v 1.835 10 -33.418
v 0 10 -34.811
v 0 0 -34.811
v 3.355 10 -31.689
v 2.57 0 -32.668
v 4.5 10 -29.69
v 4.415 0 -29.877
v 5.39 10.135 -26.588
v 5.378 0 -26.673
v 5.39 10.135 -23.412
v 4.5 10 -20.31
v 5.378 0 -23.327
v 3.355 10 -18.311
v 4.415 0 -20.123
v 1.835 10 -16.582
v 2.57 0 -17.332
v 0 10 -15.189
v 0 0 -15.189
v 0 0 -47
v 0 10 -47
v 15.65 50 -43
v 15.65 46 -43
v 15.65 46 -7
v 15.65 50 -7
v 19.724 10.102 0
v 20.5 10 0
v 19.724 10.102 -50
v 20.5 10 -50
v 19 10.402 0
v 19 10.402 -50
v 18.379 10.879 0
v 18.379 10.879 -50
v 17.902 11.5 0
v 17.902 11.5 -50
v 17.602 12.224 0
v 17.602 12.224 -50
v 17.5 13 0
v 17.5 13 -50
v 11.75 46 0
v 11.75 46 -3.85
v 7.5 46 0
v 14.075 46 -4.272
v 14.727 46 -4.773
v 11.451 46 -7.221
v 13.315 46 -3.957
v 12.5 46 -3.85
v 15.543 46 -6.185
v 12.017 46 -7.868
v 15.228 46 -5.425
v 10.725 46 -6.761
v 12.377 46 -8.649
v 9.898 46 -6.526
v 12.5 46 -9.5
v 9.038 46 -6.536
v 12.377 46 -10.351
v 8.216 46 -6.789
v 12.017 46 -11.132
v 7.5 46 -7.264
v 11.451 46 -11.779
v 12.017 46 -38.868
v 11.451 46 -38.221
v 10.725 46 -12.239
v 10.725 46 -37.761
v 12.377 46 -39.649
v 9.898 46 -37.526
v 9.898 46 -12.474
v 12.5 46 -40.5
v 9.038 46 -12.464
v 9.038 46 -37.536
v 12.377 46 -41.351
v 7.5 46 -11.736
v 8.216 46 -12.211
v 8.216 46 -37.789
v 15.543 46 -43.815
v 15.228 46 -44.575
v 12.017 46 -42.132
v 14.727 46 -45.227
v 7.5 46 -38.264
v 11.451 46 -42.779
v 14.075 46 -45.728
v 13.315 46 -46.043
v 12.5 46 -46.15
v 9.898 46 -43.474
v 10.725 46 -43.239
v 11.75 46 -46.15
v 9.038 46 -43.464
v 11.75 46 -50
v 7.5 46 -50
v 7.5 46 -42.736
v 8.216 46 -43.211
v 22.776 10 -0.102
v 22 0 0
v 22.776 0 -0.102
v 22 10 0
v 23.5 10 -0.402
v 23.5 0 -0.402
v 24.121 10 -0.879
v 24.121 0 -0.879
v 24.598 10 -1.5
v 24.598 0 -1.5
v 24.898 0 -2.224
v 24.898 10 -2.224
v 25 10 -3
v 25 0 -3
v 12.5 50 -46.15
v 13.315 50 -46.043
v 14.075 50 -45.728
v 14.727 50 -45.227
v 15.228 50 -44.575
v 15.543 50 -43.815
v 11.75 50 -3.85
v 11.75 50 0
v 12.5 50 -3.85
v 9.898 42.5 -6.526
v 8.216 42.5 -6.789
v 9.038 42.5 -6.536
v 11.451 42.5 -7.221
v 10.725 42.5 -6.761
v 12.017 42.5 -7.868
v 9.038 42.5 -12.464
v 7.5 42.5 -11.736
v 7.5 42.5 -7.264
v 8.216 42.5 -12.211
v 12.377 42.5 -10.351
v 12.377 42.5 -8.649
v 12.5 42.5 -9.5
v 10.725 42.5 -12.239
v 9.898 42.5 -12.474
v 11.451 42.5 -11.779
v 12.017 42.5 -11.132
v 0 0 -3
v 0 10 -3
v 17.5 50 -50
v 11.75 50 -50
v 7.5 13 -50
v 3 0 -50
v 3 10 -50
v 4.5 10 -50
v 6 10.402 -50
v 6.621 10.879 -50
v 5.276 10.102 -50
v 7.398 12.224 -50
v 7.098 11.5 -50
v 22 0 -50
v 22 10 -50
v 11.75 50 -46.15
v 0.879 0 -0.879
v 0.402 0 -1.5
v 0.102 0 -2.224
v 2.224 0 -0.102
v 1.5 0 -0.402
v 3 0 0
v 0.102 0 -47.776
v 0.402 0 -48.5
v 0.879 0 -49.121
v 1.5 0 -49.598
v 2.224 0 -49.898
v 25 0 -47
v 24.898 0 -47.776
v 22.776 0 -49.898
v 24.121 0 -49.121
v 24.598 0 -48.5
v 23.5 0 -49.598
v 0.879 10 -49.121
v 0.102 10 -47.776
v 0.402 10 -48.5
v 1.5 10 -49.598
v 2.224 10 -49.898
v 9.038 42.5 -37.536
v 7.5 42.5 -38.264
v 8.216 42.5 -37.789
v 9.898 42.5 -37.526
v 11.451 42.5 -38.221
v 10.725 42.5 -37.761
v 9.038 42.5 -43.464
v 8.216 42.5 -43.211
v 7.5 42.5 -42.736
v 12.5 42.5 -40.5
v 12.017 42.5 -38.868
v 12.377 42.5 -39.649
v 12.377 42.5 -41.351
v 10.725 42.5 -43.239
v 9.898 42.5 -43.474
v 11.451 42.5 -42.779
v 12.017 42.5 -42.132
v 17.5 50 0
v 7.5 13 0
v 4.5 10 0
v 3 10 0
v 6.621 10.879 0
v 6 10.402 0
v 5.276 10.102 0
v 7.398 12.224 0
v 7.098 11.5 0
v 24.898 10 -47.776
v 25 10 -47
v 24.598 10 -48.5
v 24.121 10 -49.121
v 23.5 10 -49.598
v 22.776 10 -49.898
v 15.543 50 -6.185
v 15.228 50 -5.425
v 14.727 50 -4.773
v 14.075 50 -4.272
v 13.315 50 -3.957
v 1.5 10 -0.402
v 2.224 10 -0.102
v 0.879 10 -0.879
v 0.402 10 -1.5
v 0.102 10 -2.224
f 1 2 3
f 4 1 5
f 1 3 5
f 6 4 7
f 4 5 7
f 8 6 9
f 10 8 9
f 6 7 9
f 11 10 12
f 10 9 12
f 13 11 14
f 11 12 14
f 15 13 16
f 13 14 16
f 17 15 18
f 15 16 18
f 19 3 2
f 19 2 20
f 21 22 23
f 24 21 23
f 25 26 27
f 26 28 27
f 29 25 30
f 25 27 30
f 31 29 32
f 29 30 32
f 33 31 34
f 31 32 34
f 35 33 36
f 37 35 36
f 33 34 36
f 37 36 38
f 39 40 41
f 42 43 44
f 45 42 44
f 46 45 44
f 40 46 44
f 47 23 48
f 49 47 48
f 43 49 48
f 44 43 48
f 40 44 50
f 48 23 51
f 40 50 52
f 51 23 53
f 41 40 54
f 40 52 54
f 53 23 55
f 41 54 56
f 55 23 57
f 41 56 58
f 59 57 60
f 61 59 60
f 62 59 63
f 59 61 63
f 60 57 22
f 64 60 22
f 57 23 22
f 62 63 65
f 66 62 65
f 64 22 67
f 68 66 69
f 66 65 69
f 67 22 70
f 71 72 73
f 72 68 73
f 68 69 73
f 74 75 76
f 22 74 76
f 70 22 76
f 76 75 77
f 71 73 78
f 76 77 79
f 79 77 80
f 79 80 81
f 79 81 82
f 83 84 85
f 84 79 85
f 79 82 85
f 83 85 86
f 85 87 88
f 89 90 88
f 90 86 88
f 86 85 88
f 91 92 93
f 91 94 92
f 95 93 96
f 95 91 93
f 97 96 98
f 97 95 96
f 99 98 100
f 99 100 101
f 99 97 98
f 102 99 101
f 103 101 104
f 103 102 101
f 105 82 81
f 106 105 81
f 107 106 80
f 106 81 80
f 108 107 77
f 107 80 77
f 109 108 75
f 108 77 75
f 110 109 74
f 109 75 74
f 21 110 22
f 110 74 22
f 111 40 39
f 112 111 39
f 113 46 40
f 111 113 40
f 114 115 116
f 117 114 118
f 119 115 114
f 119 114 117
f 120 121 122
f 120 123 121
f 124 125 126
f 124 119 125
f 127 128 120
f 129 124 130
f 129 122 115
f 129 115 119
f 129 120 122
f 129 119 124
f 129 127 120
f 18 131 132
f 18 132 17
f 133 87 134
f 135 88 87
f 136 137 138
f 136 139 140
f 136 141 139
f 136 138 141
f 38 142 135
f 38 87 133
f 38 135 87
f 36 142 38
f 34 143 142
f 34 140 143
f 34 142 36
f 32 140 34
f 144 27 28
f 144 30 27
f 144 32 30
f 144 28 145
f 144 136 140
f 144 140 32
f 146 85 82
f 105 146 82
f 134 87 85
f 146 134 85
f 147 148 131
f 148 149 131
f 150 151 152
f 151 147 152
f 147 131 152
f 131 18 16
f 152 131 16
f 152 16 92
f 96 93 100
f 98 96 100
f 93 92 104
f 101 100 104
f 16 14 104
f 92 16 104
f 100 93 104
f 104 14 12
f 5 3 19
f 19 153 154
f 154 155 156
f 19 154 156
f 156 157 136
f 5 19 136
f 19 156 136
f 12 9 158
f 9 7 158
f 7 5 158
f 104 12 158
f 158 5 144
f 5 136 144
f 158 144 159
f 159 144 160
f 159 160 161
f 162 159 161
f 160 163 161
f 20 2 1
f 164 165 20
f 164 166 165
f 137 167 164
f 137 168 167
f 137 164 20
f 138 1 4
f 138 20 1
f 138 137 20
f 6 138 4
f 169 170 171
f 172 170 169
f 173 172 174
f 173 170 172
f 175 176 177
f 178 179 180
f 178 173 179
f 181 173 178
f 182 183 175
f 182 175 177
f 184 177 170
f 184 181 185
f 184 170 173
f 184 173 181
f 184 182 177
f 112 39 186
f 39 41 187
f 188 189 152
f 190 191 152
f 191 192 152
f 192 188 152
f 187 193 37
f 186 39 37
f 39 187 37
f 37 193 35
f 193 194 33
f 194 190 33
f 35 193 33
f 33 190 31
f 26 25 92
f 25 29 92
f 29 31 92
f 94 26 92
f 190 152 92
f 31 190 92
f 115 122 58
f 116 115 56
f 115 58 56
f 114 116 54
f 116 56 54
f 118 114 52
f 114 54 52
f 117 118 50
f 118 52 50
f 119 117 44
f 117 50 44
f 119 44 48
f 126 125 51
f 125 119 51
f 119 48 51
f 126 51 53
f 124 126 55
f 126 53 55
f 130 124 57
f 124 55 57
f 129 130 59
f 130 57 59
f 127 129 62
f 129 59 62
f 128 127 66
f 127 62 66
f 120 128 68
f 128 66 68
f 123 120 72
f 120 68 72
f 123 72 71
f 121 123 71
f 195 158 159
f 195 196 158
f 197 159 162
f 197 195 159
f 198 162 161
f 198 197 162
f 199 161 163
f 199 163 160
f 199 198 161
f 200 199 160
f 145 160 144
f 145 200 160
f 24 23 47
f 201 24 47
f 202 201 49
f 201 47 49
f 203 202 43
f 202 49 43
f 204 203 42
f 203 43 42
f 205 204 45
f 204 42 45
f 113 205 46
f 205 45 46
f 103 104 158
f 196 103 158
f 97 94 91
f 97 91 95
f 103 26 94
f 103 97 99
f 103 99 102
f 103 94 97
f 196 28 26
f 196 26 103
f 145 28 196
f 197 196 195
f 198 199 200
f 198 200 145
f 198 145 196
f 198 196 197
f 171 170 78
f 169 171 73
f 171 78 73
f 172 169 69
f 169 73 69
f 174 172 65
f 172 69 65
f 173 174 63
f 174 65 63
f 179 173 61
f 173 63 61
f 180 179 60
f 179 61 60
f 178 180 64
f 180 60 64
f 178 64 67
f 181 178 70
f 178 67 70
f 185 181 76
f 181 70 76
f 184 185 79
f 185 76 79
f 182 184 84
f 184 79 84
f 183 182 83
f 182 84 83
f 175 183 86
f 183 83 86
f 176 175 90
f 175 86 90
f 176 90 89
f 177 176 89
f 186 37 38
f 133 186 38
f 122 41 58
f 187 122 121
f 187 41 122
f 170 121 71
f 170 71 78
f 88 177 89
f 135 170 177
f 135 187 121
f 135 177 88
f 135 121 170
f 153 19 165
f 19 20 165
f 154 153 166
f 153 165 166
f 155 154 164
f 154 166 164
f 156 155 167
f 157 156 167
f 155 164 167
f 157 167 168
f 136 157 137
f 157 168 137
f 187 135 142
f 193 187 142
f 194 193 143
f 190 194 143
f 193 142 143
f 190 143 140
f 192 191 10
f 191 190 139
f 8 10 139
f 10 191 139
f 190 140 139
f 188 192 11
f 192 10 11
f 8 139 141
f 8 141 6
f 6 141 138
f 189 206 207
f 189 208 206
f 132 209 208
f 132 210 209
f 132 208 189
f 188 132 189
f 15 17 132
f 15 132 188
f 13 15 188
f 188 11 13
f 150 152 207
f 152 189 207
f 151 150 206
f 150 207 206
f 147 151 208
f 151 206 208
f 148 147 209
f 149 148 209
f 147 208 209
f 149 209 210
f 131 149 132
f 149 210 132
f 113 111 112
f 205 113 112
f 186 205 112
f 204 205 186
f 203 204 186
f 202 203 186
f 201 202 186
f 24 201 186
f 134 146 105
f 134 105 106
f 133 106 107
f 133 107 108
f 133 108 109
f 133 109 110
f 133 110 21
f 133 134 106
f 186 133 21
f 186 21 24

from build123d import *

# Parameters (mm, degrees)
CROQUIS1_W              = 25
CROQUIS1_H              = 50
SALIENTE_EXTRUIR1_DEPTH = 10
CROQUIS2_W              = 10
CROQUIS2_H              = 50
SALIENTE_EXTRUIR2_DEPTH = 40
CROQUIS3_W              = 8
CROQUIS3_H              = 42
CORTAR_EXTRUIR1_DEPTH   = 4
REDONDEO1_R             = 3
CROQUIS4_W              = 4.1
CROQUIS4_H              = 50
CORTAR_EXTRUIR2_DEPTH   = 4
CROQUIS5_R              = 3
CORTAR_EXTRUIR3_DEPTH   = 3.5
CORTAR_EXTRUIR4_START   = -4
CORTAR_EXTRUIR4_DEPTH   = 4
REDONDEO2_R             = 3
CROQUIS7_R              = 11.5
CORTAR_EXTRUIR5_DEPTH   = 15


with BuildPart() as part:
    # Croquis1 → Saliente-Extruir1 (new body)
    with BuildSketch(Plane(origin=(0, 0, 0), x_dir=(1, 0, 0), z_dir=(0, 1, 0))):
        with Locations((12.5, 25)):
            Rectangle(CROQUIS1_W, CROQUIS1_H)
    extrude(amount=SALIENTE_EXTRUIR1_DEPTH)

    # Croquis2 → Saliente-Extruir2 (add)
    with BuildSketch(Plane(origin=(0, 10, 0), x_dir=(1, 0, 0), z_dir=(0, 1, 0))):
        with Locations((12.5, 25)):
            Rectangle(CROQUIS2_W, CROQUIS2_H)
    extrude(amount=SALIENTE_EXTRUIR2_DEPTH)

    # Croquis3 → Cortar-Extruir1 (cut)
    with BuildSketch(Plane(origin=(0, 50, 0), x_dir=(1, 0, 0), z_dir=(0, 1, 0))):
        with Locations((11.5, 25)):
            Rectangle(CROQUIS3_W, CROQUIS3_H)
    extrude(amount=-CORTAR_EXTRUIR1_DEPTH, mode=Mode.SUBTRACT)

    # Redondeo1
    redondeo1_edges = [part.edges().sort_by_distance(p)[0] for p in [
        (15.5, 48, -46),
        (15.5, 48, -4),
    ]]
    fillet(redondeo1_edges, radius=REDONDEO1_R)

    # Croquis4 → Cortar-Extruir2 (cut)
    with BuildSketch(Plane(origin=(0, 50, 0), x_dir=(1, 0, 0), z_dir=(0, 1, 0))):
        with Locations((9.55, 25)):
            Rectangle(CROQUIS4_W, CROQUIS4_H)
    extrude(amount=-CORTAR_EXTRUIR2_DEPTH, mode=Mode.SUBTRACT)

    # Croquis5 → Cortar-Extruir3 (cut)
    with BuildSketch(Plane(origin=(0, 46, 0), x_dir=(1, 0, 0), z_dir=(0, 1, 0))):
        with Locations((9.5, 9.5)):
            Circle(CROQUIS5_R)
        with Locations((9.5, 40.5)):
            Circle(CROQUIS5_R)
    extrude(amount=-CORTAR_EXTRUIR3_DEPTH, mode=Mode.SUBTRACT)

    # Croquis6 → Cortar-Extruir4 (cut)
    with BuildSketch(Plane(origin=(0, 50, 0), x_dir=(1, 0, 0), z_dir=(0, 1, 0)).offset(CORTAR_EXTRUIR4_START)):
        with BuildLine():
            Line((11.6, 4), (12.5, 4))
            ThreePointArc((12.5, 4), (14.621320344, 4.878679656), (15.5, 7))
            Line((15.5, 7), (15.5, 43))
            ThreePointArc((15.5, 43), (14.621320344, 45.121320344), (12.5, 46))
            Line((12.5, 46), (11.6, 46))
            Line((11.6, 46), (11.6, 50))
            Line((11.6, 50), (11.75, 50))
            Line((11.75, 50), (11.75, 46.15))
            Line((11.75, 46.15), (12.5, 46.15))
            ThreePointArc((12.5, 46.15), (14.727386361, 45.227386361), (15.65, 43))
            Line((15.65, 43), (15.65, 7))
            ThreePointArc((15.65, 7), (14.727386361, 4.772613639), (12.5, 3.85))
            Line((12.5, 3.85), (11.75, 3.85))
            Line((11.75, 3.85), (11.75, 0))
            Line((11.75, 0), (11.6, 0))
            Line((11.6, 0), (11.6, 4))
        make_face()
    extrude(amount=CORTAR_EXTRUIR4_DEPTH, mode=Mode.SUBTRACT)

    # Redondeo2
    redondeo2_edges = [part.edges().sort_by_distance(p)[0] for p in [
        (7.5, 10, -25),
        (17.5, 10, -25),
        (0, 5, -50),
        (25, 5, -50),
        (25, 5, 0),
        (0, 5, 0),
    ]]
    fillet(redondeo2_edges, radius=REDONDEO2_R)

    # Croquis7 → Cortar-Extruir5 (cut)
    with BuildSketch(Plane.XZ):
        with Locations((-6, -25)):
            Circle(CROQUIS7_R)
    extrude(amount=-CORTAR_EXTRUIR5_DEPTH, mode=Mode.SUBTRACT)


solid = part.part
